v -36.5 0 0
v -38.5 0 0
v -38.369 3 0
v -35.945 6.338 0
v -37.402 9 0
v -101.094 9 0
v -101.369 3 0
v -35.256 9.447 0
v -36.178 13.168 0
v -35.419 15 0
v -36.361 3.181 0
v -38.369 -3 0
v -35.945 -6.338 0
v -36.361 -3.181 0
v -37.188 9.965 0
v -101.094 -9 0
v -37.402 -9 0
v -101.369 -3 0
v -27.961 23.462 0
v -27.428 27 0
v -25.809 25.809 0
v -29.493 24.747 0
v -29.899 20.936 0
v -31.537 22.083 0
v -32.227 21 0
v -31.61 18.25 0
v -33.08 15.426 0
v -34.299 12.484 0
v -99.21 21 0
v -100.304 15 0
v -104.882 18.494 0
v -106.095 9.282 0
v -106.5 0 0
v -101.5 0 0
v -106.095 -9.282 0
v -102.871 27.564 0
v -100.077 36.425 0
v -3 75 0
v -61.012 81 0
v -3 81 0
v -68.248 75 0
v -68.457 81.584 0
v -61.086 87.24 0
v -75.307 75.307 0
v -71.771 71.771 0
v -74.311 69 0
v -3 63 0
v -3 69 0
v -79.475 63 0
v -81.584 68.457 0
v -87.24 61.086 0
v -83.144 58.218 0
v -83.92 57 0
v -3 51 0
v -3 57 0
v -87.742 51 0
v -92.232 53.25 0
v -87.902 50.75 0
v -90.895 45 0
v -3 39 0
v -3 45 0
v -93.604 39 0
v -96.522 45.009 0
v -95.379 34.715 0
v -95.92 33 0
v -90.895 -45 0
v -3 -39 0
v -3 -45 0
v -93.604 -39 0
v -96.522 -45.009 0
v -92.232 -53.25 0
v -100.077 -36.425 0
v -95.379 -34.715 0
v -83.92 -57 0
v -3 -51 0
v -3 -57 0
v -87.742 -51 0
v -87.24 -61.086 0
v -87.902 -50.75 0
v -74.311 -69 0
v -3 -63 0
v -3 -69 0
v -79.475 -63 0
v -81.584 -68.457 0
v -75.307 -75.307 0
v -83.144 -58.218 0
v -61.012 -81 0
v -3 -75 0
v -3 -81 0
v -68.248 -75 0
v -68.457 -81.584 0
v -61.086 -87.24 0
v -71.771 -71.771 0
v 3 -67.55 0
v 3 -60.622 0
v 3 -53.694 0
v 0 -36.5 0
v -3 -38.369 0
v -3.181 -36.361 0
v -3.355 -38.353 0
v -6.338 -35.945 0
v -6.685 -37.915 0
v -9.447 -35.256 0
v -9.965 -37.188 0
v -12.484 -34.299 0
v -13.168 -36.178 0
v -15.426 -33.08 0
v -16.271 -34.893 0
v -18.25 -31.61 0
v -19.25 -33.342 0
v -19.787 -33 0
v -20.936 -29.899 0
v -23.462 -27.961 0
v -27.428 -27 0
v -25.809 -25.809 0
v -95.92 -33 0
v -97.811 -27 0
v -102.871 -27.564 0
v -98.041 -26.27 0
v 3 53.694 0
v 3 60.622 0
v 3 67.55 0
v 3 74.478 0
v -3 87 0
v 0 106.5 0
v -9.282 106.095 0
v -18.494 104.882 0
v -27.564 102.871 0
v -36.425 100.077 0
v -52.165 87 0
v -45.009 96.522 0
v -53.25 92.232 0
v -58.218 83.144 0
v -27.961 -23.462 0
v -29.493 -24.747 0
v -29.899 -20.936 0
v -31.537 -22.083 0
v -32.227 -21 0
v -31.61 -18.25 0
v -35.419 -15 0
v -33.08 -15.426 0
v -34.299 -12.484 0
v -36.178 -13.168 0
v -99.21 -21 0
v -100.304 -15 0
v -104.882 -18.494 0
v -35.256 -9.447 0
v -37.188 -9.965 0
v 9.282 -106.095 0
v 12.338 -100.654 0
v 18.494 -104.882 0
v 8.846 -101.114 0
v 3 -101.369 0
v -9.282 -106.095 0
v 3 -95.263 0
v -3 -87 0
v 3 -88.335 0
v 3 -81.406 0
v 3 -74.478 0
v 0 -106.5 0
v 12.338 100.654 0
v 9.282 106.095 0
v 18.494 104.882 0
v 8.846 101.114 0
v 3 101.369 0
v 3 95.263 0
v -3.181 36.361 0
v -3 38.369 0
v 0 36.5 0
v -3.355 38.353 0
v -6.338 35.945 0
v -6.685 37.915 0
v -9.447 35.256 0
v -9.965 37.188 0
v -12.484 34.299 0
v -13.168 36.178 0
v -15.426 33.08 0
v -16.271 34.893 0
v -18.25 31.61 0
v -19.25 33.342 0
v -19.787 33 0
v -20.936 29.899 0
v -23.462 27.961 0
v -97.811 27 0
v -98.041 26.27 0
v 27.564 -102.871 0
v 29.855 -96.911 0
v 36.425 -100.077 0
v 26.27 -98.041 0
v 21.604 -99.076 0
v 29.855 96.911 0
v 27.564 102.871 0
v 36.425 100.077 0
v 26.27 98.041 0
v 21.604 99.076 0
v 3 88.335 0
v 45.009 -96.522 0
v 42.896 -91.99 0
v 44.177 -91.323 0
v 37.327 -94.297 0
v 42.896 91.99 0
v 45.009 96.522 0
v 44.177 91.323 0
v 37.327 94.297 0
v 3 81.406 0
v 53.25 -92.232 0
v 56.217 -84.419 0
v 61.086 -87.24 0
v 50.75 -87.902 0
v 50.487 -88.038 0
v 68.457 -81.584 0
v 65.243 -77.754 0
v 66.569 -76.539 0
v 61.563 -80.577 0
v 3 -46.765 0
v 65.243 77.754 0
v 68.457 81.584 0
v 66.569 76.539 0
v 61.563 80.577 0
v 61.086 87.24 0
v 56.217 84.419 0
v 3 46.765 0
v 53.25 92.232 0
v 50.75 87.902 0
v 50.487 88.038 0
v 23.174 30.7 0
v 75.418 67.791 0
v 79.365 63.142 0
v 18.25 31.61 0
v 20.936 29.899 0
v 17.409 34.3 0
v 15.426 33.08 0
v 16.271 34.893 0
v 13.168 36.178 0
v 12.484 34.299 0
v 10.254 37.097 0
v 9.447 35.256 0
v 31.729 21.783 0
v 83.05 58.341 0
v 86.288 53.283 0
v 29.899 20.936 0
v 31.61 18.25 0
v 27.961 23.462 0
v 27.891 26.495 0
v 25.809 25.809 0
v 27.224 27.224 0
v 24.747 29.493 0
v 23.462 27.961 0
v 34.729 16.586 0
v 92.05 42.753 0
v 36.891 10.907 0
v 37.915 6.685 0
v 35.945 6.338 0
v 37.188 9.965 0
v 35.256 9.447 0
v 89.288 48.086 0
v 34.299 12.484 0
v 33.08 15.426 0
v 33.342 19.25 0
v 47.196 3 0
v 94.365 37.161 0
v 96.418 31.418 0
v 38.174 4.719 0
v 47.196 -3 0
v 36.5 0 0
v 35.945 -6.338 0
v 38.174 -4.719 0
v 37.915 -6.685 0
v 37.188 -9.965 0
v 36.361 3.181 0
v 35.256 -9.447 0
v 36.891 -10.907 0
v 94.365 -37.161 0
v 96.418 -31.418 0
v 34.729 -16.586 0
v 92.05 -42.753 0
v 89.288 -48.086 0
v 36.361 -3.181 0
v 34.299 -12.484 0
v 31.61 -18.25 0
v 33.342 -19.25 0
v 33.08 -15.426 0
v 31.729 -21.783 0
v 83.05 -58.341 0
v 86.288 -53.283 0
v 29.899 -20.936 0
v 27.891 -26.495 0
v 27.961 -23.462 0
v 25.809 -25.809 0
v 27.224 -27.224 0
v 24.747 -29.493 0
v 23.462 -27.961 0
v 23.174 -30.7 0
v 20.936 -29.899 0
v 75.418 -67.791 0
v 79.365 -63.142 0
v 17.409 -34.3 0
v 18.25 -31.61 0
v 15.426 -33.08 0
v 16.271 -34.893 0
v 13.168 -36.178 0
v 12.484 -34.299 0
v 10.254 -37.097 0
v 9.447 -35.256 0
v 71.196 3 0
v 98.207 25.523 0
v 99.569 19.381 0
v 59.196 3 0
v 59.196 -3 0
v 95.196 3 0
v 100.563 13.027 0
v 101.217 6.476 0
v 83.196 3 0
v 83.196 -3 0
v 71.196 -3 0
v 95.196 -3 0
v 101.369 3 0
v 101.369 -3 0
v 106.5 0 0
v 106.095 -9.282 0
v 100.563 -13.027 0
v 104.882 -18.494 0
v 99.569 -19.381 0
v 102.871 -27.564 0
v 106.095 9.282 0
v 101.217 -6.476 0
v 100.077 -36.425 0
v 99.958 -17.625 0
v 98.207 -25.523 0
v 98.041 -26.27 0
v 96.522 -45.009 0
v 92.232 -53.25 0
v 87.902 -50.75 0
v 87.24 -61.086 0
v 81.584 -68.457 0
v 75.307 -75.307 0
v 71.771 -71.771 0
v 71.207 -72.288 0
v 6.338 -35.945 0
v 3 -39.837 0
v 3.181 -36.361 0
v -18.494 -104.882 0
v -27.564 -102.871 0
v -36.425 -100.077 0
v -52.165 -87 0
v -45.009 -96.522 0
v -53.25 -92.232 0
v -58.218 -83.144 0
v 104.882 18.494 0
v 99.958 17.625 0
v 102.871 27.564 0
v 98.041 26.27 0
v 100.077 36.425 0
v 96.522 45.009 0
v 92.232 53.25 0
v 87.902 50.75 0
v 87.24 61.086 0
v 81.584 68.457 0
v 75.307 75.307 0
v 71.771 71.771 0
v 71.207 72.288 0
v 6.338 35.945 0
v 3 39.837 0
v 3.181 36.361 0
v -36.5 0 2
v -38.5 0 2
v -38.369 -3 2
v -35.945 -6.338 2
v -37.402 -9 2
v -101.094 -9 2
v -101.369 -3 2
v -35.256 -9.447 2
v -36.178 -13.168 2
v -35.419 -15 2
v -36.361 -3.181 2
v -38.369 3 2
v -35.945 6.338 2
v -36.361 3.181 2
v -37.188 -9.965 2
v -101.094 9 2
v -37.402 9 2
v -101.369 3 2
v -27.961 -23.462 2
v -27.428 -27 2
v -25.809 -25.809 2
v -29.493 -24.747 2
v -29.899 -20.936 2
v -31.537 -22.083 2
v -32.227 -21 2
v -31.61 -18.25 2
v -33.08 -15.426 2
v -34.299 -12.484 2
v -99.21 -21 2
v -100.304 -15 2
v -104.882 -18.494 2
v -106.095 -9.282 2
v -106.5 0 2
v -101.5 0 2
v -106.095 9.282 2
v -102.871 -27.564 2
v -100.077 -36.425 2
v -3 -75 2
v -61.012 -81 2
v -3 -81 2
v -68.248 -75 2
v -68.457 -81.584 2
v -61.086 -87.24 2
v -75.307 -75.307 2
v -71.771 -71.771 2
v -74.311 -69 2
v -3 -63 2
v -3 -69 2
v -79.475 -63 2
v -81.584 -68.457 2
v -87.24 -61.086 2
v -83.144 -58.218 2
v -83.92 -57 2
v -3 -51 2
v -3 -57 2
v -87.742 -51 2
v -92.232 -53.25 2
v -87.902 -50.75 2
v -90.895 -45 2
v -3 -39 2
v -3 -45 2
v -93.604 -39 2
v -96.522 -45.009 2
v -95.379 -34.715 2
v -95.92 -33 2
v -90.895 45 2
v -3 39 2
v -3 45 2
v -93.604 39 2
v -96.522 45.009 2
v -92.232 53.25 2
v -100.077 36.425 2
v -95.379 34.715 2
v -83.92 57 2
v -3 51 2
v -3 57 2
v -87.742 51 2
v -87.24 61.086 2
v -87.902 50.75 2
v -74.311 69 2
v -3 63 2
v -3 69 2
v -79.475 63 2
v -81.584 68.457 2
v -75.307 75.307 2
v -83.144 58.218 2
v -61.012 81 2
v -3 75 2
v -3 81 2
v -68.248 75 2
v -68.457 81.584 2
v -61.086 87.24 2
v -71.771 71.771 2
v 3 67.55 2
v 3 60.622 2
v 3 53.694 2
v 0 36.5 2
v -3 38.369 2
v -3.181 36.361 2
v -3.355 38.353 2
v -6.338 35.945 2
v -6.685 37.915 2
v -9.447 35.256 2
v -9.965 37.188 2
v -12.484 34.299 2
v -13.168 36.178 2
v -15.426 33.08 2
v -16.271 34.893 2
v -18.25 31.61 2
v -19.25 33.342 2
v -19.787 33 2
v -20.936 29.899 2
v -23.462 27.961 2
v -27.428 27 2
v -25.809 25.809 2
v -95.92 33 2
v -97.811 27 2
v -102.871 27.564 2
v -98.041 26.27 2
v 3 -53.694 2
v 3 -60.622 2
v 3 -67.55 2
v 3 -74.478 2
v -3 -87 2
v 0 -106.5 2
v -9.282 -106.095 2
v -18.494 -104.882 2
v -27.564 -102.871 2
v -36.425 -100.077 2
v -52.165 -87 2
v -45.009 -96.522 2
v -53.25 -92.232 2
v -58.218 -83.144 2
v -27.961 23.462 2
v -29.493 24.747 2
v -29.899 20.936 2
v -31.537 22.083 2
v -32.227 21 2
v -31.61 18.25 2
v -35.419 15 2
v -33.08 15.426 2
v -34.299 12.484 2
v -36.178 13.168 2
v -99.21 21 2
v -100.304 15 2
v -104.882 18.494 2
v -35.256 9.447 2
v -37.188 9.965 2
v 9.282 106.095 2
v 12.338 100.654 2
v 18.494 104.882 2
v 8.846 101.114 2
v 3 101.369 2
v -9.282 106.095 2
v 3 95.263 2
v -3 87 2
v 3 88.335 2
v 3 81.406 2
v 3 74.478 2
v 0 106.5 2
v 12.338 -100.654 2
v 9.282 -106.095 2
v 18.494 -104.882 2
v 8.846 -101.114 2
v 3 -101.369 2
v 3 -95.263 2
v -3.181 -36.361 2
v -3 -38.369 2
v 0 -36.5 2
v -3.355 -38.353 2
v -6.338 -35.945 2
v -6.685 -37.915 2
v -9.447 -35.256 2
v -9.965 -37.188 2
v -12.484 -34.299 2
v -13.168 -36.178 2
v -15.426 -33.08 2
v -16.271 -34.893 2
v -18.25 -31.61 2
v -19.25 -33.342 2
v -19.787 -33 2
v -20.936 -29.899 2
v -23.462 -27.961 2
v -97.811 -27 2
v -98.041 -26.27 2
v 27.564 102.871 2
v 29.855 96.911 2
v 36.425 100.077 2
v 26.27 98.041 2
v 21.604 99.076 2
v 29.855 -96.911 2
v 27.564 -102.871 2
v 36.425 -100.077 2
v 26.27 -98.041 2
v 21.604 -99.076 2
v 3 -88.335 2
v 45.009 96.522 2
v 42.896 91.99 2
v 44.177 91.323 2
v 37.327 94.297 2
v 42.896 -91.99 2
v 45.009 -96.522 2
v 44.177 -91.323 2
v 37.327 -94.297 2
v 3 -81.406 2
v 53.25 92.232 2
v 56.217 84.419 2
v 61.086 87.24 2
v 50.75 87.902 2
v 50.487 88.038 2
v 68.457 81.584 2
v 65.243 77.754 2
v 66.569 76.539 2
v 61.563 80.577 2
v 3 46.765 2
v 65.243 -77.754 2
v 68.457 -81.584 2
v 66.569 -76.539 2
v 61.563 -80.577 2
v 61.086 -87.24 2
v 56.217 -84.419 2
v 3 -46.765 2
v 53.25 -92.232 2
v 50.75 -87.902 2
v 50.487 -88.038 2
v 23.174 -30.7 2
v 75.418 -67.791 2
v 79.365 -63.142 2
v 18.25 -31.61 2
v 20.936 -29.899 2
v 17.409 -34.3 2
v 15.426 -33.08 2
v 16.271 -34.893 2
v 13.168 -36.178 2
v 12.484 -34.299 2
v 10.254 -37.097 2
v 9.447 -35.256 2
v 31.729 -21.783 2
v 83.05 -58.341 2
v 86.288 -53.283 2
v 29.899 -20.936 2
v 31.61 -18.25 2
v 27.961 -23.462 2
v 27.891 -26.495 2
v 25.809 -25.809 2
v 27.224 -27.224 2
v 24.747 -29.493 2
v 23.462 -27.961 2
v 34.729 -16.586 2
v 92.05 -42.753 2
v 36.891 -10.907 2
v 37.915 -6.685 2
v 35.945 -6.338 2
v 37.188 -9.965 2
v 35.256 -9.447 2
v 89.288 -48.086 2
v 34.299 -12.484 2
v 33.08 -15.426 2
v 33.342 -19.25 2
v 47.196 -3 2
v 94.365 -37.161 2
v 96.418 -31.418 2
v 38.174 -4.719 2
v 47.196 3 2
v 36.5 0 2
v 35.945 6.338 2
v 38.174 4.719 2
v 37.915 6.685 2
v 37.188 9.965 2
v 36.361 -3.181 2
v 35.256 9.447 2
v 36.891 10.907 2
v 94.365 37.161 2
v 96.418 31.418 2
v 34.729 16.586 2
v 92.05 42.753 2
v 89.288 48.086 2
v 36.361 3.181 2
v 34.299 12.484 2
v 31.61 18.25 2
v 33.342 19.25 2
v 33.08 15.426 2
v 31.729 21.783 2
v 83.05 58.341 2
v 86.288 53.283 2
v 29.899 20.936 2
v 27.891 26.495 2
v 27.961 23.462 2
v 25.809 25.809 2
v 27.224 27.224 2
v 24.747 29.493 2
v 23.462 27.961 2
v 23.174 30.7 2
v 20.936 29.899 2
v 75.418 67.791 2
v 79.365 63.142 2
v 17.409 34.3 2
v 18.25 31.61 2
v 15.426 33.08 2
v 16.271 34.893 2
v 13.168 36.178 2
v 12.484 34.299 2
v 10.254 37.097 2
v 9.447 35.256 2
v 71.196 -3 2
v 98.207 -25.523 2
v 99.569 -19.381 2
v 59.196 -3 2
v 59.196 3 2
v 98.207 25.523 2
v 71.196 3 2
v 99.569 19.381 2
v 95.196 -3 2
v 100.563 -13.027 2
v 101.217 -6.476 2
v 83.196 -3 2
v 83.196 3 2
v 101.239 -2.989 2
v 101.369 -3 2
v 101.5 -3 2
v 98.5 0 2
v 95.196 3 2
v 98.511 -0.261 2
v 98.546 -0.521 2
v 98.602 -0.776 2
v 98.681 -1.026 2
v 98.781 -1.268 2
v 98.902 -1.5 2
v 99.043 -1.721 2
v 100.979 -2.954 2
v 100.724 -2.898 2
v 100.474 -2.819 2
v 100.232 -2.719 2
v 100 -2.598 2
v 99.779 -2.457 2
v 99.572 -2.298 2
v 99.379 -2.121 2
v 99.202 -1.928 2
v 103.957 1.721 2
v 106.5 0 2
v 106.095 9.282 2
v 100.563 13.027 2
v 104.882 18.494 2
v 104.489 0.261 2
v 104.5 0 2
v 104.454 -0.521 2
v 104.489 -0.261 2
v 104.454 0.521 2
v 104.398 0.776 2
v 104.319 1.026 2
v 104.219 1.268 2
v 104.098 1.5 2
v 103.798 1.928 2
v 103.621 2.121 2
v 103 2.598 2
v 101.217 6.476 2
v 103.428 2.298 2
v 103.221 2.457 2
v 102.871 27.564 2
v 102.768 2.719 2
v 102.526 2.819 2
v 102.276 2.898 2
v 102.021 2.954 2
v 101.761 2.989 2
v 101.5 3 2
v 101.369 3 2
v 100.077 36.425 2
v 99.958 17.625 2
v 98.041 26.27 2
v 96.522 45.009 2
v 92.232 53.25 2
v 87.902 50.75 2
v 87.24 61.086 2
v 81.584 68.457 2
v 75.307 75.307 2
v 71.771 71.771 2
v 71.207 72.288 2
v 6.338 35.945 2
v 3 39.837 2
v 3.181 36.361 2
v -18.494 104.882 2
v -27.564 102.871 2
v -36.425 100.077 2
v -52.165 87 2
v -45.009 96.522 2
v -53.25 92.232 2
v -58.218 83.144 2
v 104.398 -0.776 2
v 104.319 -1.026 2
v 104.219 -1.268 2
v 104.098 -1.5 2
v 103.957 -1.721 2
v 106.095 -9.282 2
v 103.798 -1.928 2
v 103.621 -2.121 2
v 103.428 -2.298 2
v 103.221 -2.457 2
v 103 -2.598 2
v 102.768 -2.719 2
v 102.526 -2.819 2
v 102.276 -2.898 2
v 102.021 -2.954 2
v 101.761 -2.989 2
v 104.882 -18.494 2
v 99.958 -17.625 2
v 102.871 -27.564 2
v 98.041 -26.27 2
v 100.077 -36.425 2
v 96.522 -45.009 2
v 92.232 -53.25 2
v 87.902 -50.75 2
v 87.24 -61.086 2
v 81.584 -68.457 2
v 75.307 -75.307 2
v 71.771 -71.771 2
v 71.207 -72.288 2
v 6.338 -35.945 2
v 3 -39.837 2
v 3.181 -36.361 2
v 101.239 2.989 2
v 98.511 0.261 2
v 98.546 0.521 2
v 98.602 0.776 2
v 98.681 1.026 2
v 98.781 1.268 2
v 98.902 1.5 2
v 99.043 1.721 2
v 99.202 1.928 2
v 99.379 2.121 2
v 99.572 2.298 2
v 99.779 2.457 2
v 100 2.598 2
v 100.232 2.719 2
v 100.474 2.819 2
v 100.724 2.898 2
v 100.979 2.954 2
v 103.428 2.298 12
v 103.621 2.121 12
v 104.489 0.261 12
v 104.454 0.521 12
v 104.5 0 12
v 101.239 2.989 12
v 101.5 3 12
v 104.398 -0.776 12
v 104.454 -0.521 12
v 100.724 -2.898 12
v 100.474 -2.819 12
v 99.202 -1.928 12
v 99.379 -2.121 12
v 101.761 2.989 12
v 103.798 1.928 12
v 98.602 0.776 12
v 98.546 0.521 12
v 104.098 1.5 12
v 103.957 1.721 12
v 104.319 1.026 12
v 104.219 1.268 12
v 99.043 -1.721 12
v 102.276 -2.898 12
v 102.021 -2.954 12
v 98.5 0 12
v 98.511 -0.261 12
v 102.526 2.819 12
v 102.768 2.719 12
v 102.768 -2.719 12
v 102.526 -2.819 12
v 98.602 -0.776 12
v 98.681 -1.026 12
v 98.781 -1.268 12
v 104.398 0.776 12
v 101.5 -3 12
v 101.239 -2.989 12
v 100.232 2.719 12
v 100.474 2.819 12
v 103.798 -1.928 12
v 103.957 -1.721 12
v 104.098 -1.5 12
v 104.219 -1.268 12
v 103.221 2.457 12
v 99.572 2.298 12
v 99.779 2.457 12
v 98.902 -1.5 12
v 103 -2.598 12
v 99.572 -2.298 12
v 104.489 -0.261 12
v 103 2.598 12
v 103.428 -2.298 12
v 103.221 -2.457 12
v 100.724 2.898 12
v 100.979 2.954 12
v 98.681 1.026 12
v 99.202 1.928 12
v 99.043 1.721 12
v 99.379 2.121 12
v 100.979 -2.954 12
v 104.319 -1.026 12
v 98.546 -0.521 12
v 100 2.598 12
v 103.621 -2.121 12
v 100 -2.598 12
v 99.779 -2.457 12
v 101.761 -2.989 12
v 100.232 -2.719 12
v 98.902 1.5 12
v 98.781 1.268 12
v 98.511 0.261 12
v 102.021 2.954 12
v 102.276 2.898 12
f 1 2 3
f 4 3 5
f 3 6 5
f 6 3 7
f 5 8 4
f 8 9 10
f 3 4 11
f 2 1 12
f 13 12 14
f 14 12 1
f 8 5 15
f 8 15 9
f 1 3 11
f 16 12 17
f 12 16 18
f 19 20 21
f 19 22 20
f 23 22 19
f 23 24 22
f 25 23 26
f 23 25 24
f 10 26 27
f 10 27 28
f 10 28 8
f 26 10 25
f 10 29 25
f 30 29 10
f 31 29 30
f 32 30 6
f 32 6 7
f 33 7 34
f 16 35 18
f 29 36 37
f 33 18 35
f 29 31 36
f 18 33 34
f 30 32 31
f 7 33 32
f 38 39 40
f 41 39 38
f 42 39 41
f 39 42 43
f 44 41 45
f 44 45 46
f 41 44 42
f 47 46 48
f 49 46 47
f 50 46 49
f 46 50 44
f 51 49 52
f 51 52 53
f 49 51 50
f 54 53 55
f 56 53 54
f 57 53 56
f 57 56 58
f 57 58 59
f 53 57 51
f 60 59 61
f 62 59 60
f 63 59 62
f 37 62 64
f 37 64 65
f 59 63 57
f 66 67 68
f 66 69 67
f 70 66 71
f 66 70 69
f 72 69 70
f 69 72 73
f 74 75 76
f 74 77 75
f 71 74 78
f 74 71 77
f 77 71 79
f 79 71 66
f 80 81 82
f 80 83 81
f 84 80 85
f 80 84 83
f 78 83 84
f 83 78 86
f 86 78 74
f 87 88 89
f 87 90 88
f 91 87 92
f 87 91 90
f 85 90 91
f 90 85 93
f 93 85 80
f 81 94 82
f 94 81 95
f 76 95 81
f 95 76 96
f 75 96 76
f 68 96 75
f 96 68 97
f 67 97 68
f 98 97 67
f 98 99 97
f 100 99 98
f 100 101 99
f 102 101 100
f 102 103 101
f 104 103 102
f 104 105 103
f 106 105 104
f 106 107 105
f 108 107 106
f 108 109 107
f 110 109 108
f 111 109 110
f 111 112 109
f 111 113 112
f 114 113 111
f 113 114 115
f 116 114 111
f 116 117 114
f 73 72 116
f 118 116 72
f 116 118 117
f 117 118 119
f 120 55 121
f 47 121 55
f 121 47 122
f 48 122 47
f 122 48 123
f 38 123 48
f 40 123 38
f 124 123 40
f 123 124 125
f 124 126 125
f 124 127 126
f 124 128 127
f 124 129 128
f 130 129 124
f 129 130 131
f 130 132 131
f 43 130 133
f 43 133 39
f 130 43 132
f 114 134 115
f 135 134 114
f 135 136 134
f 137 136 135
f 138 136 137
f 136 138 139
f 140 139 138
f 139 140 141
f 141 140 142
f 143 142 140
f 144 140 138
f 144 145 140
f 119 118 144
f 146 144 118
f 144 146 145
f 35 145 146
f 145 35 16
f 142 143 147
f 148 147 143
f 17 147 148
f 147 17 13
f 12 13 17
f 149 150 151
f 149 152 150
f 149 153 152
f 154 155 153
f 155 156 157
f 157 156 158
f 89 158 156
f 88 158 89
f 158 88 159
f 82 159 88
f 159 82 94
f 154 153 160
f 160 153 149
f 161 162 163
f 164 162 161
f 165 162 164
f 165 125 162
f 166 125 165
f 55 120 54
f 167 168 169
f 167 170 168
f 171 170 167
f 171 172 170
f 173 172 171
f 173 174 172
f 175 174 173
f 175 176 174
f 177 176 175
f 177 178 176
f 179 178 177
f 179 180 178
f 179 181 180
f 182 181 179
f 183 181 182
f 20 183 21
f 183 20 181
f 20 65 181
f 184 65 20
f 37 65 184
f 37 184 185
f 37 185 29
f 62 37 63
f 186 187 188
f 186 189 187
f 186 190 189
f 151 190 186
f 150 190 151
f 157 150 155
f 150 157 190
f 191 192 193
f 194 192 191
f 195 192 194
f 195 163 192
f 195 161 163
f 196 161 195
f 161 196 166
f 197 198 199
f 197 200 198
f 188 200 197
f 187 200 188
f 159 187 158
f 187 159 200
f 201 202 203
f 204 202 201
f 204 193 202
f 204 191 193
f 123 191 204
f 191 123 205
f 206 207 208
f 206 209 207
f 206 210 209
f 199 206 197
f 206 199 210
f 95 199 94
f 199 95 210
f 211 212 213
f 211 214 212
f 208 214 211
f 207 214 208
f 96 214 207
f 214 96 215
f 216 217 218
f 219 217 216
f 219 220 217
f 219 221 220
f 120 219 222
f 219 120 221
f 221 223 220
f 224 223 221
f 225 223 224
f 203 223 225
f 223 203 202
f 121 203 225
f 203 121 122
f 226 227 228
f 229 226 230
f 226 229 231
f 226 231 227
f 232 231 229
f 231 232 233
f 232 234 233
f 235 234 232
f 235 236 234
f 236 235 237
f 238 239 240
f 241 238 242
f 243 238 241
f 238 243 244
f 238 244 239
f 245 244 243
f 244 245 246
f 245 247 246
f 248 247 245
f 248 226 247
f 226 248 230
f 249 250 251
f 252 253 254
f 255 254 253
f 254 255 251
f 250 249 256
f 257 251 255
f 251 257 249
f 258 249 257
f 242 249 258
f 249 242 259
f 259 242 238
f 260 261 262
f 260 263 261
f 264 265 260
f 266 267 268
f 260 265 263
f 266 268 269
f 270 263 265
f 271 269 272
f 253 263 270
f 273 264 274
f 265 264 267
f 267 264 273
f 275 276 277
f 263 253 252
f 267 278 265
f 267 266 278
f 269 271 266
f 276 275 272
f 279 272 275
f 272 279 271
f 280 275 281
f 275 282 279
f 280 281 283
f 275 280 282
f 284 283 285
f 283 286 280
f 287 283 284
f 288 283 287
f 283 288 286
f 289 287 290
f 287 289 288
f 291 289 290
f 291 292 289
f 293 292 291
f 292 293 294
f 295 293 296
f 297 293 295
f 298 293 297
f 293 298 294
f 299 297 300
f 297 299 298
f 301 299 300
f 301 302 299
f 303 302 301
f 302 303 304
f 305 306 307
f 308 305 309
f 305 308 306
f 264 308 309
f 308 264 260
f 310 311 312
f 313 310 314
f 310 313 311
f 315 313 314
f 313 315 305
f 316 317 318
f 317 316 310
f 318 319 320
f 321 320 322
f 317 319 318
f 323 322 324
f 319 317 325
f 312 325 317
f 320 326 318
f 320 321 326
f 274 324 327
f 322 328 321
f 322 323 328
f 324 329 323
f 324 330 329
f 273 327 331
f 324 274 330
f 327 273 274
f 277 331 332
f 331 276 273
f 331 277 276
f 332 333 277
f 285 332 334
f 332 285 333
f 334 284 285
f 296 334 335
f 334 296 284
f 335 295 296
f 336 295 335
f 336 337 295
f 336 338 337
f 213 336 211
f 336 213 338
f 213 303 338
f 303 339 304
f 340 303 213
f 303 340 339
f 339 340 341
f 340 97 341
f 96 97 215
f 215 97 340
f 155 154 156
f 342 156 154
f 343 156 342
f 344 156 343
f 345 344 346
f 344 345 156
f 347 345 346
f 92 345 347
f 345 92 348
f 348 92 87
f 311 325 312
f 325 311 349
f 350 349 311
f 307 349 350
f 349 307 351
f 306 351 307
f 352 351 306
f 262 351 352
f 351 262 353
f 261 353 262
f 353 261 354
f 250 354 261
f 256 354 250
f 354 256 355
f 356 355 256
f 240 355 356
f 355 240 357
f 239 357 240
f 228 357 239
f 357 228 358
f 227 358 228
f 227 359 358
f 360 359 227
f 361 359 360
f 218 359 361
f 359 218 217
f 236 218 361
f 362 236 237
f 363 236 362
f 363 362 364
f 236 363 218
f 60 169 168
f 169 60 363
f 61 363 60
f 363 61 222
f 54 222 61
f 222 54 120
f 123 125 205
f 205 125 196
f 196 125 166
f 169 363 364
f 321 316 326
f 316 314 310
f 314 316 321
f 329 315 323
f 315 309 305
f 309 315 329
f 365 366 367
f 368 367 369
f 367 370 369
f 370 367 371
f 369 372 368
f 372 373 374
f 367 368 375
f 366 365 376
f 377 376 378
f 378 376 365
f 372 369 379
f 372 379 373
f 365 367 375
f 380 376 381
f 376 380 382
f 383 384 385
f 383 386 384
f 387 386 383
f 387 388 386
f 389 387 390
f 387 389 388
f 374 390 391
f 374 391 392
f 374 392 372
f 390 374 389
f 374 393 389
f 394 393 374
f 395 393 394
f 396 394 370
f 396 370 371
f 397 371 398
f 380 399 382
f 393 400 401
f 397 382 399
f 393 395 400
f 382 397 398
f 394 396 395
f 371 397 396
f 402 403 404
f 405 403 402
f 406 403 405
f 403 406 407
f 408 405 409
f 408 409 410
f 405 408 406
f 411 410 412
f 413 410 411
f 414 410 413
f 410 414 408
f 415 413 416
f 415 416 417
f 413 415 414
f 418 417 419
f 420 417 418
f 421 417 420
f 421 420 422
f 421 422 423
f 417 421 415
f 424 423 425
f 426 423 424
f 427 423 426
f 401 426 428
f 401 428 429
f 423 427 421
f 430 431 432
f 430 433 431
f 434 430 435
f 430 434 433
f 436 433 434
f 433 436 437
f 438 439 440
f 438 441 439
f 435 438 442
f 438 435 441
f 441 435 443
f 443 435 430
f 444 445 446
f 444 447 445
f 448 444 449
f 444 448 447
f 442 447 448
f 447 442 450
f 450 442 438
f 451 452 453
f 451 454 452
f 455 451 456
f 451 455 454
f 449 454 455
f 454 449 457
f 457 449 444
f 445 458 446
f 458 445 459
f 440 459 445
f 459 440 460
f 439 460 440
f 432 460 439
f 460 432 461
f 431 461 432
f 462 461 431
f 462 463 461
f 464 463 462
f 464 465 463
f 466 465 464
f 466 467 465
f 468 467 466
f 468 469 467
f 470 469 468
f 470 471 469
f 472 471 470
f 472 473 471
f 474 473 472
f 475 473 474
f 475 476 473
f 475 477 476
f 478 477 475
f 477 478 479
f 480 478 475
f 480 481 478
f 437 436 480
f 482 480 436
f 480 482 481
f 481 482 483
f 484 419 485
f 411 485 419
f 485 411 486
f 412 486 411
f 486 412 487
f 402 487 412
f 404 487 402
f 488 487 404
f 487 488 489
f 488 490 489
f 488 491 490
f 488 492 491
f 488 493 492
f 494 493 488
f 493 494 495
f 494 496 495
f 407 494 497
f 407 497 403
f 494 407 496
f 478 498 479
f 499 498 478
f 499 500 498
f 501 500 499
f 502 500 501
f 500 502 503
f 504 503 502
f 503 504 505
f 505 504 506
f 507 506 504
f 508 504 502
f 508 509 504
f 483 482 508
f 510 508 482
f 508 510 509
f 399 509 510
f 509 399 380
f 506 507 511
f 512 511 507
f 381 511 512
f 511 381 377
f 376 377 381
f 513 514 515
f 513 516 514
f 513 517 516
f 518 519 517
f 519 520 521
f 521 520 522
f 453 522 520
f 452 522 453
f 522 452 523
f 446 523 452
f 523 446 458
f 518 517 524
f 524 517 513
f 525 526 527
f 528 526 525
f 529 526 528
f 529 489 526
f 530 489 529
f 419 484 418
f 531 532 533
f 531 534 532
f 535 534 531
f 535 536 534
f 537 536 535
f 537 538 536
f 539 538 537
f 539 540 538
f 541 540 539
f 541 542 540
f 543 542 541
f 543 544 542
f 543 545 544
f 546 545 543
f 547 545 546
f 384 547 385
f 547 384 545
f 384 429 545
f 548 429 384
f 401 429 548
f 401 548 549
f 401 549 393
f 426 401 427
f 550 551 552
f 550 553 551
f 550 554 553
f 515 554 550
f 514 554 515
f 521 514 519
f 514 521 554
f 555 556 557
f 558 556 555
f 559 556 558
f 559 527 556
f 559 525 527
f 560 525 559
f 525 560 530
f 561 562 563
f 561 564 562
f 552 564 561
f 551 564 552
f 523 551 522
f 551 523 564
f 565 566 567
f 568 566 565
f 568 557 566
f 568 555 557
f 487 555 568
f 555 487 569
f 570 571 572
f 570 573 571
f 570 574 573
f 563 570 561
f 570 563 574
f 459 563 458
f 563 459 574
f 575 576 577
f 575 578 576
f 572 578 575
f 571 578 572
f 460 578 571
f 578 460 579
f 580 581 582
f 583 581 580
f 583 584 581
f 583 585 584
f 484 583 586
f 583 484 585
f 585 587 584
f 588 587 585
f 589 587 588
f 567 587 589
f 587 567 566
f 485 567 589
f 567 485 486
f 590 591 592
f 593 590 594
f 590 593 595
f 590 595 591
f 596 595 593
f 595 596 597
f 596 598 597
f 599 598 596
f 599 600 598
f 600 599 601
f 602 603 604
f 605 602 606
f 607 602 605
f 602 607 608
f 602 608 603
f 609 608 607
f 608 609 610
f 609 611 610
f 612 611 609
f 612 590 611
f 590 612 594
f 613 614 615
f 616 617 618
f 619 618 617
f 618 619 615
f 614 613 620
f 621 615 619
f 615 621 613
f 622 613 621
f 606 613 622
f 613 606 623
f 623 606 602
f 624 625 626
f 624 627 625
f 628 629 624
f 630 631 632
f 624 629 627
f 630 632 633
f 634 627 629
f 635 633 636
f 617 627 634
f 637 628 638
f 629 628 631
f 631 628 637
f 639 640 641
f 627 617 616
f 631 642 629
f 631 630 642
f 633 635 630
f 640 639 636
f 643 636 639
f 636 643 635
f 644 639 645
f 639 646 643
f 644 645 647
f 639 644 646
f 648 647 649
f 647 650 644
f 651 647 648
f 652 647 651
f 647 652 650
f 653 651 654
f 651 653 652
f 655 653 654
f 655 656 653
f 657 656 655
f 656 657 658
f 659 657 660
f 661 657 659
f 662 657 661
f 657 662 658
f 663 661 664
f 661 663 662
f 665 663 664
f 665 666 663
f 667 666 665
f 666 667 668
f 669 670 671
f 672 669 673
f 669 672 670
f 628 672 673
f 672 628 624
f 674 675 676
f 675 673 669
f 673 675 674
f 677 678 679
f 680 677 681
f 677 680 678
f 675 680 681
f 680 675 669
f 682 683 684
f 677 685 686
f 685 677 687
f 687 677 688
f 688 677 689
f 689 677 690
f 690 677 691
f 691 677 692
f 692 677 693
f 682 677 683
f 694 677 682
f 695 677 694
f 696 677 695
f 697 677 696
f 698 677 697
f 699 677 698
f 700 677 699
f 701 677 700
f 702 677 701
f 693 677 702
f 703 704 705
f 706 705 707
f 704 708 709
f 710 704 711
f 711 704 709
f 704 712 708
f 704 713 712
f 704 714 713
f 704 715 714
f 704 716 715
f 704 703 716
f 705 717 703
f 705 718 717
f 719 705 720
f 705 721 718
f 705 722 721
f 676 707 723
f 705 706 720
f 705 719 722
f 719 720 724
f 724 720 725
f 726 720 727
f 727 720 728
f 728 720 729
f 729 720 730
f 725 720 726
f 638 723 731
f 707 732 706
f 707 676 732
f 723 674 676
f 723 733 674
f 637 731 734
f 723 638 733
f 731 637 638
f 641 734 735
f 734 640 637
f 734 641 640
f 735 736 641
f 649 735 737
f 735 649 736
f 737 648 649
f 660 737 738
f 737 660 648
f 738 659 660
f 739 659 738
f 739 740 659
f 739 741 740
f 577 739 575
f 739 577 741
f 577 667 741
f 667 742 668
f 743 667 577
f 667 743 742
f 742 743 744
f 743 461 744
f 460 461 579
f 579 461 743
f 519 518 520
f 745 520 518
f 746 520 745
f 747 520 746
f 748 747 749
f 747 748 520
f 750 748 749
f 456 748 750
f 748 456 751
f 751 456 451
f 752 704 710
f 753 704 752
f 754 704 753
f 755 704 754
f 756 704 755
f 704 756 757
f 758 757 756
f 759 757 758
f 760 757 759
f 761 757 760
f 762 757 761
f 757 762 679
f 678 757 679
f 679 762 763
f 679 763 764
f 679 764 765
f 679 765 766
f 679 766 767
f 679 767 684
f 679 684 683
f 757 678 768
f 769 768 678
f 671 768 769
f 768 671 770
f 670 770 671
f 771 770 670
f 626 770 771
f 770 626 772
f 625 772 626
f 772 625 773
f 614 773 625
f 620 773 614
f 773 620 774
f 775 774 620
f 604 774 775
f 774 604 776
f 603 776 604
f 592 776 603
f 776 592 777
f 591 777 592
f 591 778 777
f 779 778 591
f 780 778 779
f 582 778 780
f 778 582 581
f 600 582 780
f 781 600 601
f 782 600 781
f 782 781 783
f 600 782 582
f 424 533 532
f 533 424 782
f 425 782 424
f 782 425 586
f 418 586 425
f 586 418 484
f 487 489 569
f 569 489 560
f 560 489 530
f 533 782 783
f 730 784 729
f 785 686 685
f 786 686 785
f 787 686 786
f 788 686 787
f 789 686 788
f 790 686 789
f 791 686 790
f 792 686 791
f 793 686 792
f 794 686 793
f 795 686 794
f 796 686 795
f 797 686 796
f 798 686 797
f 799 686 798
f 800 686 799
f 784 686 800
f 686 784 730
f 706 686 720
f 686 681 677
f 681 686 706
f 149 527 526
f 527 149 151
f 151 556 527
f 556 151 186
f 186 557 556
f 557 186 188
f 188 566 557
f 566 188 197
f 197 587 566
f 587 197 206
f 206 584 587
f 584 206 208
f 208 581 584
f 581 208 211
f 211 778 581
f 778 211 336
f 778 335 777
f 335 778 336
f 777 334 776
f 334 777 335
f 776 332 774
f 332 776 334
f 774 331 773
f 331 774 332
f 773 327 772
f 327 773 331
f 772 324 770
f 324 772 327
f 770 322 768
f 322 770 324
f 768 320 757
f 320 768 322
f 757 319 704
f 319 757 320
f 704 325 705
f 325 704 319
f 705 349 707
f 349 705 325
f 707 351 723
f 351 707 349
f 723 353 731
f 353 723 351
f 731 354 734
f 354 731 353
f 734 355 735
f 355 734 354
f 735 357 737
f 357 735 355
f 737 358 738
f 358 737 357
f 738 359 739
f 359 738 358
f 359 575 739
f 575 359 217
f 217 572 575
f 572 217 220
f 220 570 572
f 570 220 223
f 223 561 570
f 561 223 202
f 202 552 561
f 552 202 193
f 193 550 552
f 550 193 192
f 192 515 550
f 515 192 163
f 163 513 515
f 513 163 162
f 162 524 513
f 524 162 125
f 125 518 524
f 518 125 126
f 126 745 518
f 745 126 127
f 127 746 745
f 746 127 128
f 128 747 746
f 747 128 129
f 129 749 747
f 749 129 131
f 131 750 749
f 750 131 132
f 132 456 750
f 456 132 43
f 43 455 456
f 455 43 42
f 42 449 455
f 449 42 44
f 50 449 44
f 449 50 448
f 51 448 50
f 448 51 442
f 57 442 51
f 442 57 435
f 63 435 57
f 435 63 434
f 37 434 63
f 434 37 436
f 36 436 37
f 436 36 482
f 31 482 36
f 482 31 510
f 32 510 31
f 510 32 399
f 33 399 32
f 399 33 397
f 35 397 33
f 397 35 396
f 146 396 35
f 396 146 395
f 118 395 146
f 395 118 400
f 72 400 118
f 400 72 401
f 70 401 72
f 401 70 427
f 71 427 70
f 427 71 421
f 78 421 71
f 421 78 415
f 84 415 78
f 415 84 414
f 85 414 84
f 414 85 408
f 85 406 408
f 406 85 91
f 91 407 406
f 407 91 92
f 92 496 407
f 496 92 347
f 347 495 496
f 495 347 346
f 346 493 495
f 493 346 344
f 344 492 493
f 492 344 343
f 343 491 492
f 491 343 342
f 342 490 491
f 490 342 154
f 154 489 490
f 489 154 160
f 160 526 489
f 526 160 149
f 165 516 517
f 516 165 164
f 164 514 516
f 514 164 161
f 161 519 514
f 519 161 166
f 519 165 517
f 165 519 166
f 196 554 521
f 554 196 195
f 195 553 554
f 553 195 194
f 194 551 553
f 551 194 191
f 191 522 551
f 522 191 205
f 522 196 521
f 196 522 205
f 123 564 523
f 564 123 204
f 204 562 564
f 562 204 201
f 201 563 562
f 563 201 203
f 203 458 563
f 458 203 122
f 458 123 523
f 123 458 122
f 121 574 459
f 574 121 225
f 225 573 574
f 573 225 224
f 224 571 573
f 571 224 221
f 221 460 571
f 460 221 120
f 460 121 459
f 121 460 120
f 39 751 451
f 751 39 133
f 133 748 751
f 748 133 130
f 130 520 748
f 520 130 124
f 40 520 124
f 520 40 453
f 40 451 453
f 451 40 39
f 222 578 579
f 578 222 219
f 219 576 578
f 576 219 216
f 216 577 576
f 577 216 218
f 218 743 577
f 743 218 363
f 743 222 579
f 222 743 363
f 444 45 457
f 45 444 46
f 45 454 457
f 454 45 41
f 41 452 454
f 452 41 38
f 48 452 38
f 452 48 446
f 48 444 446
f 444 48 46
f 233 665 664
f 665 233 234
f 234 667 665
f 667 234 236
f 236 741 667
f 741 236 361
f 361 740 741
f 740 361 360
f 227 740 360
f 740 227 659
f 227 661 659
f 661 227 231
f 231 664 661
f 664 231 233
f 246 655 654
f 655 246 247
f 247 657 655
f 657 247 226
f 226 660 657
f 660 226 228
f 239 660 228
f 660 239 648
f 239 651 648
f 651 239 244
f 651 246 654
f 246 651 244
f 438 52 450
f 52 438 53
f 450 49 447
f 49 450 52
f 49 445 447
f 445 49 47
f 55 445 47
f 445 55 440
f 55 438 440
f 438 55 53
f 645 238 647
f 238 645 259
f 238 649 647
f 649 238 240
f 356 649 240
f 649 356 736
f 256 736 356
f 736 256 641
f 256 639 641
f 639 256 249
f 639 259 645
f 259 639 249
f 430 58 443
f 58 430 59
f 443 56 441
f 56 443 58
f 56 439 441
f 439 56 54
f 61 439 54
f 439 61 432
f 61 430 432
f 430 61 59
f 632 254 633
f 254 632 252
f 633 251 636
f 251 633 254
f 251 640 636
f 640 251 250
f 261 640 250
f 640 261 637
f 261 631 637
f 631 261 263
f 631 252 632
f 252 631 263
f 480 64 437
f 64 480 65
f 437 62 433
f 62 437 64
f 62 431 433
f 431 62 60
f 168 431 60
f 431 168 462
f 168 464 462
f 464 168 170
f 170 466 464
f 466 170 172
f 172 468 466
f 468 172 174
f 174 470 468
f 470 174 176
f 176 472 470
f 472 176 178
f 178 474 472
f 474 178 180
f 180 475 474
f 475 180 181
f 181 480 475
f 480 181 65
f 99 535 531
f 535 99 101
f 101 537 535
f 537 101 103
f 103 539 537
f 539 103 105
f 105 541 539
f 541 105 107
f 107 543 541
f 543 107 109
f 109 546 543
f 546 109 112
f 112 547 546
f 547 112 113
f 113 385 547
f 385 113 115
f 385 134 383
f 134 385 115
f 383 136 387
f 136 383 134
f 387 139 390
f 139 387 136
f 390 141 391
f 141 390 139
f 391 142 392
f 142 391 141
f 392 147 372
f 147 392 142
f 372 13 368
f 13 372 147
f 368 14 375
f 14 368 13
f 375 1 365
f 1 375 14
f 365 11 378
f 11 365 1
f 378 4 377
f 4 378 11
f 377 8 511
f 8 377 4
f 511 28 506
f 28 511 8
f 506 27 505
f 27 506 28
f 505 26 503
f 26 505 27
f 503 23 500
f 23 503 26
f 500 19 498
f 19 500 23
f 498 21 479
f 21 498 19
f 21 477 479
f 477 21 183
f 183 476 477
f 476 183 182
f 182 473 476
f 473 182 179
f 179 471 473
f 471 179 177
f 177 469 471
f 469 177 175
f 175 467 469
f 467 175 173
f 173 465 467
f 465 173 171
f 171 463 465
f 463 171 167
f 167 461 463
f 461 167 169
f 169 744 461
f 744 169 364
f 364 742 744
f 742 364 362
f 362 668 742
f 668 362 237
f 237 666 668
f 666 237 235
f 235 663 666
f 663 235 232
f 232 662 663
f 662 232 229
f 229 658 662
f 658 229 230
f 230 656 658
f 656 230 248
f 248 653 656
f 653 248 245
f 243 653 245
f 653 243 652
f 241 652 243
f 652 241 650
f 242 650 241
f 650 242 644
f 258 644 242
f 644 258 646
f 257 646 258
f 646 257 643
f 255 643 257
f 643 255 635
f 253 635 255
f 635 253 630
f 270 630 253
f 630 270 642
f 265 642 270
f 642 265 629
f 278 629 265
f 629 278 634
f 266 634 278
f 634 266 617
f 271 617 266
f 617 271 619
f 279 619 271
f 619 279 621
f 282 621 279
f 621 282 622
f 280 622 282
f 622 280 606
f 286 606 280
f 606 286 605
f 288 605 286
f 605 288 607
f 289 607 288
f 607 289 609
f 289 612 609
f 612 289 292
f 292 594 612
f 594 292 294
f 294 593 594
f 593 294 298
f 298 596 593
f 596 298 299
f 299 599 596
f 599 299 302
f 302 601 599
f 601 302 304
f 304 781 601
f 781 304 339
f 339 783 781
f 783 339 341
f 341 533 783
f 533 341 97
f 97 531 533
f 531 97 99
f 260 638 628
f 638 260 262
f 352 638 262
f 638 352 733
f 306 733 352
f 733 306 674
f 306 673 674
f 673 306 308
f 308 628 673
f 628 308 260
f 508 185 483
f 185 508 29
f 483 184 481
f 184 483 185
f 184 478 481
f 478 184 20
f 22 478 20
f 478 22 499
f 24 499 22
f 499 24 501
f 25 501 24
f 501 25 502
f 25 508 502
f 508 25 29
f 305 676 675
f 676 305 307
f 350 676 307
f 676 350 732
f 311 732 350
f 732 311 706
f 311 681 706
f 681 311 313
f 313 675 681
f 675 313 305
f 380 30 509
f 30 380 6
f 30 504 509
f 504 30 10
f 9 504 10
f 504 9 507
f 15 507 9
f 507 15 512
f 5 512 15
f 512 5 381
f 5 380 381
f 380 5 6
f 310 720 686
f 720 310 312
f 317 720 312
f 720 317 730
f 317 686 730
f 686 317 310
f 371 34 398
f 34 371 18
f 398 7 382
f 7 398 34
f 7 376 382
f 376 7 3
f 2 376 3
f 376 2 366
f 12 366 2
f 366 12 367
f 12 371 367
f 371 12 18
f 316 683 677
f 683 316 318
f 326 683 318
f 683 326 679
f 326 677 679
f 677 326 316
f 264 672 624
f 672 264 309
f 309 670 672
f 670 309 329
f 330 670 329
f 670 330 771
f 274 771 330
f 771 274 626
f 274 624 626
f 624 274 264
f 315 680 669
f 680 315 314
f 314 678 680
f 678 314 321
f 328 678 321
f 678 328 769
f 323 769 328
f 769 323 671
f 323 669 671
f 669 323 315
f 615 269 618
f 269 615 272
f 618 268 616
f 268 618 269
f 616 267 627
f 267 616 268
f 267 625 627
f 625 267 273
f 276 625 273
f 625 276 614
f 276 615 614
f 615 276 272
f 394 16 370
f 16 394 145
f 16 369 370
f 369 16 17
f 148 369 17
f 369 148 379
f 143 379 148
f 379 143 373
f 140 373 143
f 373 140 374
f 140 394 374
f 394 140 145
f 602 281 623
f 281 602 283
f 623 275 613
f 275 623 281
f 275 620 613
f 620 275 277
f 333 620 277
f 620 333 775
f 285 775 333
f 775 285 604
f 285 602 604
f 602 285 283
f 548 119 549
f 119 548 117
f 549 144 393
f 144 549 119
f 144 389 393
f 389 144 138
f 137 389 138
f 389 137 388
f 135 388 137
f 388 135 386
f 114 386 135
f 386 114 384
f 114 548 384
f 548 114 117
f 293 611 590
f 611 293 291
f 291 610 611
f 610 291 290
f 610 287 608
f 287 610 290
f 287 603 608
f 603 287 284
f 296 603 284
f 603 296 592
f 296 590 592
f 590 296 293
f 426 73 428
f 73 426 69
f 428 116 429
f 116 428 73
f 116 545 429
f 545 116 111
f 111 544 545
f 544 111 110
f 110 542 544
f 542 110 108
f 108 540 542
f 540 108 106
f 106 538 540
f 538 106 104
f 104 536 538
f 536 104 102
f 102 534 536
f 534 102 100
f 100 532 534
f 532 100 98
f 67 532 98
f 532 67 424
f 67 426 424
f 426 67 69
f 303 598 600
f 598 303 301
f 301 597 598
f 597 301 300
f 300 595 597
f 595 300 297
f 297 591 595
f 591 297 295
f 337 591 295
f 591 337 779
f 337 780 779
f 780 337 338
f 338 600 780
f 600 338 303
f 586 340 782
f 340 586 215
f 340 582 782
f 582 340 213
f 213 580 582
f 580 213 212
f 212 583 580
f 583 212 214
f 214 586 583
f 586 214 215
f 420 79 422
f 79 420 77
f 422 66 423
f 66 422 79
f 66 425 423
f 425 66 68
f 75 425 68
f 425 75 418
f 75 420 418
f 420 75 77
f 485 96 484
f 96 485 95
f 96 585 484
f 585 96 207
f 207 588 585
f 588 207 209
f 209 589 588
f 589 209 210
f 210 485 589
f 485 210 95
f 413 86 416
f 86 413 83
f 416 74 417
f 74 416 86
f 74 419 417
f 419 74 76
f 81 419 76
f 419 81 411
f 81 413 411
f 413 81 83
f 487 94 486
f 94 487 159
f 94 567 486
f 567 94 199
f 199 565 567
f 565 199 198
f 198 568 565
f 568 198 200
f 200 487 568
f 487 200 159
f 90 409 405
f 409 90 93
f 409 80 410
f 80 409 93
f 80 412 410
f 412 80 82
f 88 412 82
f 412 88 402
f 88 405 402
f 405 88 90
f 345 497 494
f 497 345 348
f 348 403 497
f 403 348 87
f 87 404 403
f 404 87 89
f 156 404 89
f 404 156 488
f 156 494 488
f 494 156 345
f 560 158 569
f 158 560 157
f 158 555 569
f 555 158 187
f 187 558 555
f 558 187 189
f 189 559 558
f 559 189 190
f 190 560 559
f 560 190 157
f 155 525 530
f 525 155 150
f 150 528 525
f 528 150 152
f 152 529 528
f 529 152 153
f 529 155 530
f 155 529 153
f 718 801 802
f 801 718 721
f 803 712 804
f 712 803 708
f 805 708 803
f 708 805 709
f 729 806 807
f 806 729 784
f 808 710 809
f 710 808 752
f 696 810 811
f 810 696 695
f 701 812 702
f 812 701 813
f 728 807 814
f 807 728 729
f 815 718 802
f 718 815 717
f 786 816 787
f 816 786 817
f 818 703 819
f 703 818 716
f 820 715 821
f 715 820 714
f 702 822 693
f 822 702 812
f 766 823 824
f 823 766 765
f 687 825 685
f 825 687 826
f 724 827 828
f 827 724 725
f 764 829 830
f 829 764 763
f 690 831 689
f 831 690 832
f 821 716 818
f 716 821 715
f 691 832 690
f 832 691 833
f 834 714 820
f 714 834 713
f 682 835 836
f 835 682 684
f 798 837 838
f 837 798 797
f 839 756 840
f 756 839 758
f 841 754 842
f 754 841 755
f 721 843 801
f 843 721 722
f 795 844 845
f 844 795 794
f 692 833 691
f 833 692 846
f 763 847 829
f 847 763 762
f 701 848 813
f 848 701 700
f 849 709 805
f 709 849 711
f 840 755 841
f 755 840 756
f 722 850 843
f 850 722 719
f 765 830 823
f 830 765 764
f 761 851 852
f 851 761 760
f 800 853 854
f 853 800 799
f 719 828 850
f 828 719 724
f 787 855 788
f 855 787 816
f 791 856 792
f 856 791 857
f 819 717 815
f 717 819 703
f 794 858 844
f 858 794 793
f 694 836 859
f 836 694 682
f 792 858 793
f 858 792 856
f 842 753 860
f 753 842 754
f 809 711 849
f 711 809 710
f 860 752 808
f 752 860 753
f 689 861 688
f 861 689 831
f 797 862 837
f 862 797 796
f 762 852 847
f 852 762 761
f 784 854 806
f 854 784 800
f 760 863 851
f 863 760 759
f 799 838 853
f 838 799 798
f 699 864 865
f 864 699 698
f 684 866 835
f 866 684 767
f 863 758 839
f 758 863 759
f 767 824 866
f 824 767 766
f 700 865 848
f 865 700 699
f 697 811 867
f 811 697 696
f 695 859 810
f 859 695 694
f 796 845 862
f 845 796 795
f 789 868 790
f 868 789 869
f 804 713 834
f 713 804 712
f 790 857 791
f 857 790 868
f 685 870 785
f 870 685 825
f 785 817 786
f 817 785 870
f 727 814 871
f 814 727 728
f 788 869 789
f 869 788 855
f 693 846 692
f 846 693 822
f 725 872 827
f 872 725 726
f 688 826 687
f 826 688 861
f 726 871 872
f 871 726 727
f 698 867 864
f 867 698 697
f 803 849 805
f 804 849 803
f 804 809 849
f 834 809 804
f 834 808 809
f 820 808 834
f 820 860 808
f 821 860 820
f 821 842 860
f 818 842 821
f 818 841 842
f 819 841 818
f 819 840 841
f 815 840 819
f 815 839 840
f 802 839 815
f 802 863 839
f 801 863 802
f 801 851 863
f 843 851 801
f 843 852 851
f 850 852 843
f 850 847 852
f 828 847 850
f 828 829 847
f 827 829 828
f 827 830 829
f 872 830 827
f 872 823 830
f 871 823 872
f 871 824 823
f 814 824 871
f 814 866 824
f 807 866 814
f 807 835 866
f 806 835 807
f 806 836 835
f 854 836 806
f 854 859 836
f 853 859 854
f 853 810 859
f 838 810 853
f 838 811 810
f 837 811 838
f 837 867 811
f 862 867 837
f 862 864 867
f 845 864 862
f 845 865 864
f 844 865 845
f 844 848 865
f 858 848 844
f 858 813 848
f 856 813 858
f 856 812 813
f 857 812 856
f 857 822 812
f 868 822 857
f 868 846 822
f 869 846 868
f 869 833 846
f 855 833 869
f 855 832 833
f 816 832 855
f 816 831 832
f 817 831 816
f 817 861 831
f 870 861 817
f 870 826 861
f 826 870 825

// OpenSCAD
/*                                                 -*- c++ -*-
 * A Bahtinov mask generator.
 * Units in mm, default values are for
 * a Celestron NexStar GPS 8.
 *
 * Copyright 2013-2014, Brent Burton
 * License: CC-BY-SA
 *
 * Updated: 2014-06-23
 */

// This is the diameter of the mask.
outerDiameter = 215; // [80:400]

// The telescope light's path diameter.
aperture = 203; // [80:400]

// Diameter of secondary mirror holder. If no secondary, set to 0.
centerHoleDiameter = 71; // [0:90]

// Width of the gaps and the bars.
gap = 6; // [4:10]

/* create a series of bars covering roughly one half of the
 * scope aperture. Located in the +X side.
 */
module bars(gap, width, num=5) {
    num = round(num);
    for (i=[-num:num]) {
        translate([width/2,i*2*gap]) square([width,gap], center=true);
    }
}

module bahtinovBars(gap,width) {
    numBars = aperture/2 / gap / 2 -1;
    // +X +Y bars
    intersection() {
        rotate([0,0,30]) bars(gap, width, numBars);
        square([outerDiameter/2, outerDiameter/2], center=false);
    }
    // +X -Y bars
    intersection() {
        rotate([0,0,-30]) bars(gap, width, numBars);
        translate([0,-outerDiameter/2]) square([outerDiameter/2, outerDiameter/2], center=false);
    }
    // -X bars
    rotate([0,0,180]) bars(gap, width, numBars);
}

$fn=72;
module bahtinov2D() {
    width = aperture/2;
    difference() {                          // overall plate minus center hole
        union() {
            difference() {                  // trims the mask to aperture size
                circle(r=aperture/2+1);
                bahtinovBars(gap,width);
            }
            difference() {                  // makes the outer margin
                circle(r=outerDiameter/2-1);
                circle(r=aperture/2);
            }
            // Add horizontal and vertical structural bars:
            square([gap,2*(aperture/2+1)], center=true);
            translate([aperture/4,0]) square([aperture/2+1,gap], center=true);
            // Add center hole margin if needed:
            if (centerHoleDiameter > 0 && centerHoleDiameter < outerDiameter) {
                circle(r=(centerHoleDiameter+gap)/2);
            }
        }
        // subtract center hole if needed
        if (centerHoleDiameter > 0 && centerHoleDiameter < outerDiameter) {
            circle(r=centerHoleDiameter/2+1);
        }
    }
}

union() {
    linear_extrude(height=2) bahtinov2D();
    // add a little handle
    translate([outerDiameter/2-gap,0,0]) cylinder(r=gap/2, h=12);
}
